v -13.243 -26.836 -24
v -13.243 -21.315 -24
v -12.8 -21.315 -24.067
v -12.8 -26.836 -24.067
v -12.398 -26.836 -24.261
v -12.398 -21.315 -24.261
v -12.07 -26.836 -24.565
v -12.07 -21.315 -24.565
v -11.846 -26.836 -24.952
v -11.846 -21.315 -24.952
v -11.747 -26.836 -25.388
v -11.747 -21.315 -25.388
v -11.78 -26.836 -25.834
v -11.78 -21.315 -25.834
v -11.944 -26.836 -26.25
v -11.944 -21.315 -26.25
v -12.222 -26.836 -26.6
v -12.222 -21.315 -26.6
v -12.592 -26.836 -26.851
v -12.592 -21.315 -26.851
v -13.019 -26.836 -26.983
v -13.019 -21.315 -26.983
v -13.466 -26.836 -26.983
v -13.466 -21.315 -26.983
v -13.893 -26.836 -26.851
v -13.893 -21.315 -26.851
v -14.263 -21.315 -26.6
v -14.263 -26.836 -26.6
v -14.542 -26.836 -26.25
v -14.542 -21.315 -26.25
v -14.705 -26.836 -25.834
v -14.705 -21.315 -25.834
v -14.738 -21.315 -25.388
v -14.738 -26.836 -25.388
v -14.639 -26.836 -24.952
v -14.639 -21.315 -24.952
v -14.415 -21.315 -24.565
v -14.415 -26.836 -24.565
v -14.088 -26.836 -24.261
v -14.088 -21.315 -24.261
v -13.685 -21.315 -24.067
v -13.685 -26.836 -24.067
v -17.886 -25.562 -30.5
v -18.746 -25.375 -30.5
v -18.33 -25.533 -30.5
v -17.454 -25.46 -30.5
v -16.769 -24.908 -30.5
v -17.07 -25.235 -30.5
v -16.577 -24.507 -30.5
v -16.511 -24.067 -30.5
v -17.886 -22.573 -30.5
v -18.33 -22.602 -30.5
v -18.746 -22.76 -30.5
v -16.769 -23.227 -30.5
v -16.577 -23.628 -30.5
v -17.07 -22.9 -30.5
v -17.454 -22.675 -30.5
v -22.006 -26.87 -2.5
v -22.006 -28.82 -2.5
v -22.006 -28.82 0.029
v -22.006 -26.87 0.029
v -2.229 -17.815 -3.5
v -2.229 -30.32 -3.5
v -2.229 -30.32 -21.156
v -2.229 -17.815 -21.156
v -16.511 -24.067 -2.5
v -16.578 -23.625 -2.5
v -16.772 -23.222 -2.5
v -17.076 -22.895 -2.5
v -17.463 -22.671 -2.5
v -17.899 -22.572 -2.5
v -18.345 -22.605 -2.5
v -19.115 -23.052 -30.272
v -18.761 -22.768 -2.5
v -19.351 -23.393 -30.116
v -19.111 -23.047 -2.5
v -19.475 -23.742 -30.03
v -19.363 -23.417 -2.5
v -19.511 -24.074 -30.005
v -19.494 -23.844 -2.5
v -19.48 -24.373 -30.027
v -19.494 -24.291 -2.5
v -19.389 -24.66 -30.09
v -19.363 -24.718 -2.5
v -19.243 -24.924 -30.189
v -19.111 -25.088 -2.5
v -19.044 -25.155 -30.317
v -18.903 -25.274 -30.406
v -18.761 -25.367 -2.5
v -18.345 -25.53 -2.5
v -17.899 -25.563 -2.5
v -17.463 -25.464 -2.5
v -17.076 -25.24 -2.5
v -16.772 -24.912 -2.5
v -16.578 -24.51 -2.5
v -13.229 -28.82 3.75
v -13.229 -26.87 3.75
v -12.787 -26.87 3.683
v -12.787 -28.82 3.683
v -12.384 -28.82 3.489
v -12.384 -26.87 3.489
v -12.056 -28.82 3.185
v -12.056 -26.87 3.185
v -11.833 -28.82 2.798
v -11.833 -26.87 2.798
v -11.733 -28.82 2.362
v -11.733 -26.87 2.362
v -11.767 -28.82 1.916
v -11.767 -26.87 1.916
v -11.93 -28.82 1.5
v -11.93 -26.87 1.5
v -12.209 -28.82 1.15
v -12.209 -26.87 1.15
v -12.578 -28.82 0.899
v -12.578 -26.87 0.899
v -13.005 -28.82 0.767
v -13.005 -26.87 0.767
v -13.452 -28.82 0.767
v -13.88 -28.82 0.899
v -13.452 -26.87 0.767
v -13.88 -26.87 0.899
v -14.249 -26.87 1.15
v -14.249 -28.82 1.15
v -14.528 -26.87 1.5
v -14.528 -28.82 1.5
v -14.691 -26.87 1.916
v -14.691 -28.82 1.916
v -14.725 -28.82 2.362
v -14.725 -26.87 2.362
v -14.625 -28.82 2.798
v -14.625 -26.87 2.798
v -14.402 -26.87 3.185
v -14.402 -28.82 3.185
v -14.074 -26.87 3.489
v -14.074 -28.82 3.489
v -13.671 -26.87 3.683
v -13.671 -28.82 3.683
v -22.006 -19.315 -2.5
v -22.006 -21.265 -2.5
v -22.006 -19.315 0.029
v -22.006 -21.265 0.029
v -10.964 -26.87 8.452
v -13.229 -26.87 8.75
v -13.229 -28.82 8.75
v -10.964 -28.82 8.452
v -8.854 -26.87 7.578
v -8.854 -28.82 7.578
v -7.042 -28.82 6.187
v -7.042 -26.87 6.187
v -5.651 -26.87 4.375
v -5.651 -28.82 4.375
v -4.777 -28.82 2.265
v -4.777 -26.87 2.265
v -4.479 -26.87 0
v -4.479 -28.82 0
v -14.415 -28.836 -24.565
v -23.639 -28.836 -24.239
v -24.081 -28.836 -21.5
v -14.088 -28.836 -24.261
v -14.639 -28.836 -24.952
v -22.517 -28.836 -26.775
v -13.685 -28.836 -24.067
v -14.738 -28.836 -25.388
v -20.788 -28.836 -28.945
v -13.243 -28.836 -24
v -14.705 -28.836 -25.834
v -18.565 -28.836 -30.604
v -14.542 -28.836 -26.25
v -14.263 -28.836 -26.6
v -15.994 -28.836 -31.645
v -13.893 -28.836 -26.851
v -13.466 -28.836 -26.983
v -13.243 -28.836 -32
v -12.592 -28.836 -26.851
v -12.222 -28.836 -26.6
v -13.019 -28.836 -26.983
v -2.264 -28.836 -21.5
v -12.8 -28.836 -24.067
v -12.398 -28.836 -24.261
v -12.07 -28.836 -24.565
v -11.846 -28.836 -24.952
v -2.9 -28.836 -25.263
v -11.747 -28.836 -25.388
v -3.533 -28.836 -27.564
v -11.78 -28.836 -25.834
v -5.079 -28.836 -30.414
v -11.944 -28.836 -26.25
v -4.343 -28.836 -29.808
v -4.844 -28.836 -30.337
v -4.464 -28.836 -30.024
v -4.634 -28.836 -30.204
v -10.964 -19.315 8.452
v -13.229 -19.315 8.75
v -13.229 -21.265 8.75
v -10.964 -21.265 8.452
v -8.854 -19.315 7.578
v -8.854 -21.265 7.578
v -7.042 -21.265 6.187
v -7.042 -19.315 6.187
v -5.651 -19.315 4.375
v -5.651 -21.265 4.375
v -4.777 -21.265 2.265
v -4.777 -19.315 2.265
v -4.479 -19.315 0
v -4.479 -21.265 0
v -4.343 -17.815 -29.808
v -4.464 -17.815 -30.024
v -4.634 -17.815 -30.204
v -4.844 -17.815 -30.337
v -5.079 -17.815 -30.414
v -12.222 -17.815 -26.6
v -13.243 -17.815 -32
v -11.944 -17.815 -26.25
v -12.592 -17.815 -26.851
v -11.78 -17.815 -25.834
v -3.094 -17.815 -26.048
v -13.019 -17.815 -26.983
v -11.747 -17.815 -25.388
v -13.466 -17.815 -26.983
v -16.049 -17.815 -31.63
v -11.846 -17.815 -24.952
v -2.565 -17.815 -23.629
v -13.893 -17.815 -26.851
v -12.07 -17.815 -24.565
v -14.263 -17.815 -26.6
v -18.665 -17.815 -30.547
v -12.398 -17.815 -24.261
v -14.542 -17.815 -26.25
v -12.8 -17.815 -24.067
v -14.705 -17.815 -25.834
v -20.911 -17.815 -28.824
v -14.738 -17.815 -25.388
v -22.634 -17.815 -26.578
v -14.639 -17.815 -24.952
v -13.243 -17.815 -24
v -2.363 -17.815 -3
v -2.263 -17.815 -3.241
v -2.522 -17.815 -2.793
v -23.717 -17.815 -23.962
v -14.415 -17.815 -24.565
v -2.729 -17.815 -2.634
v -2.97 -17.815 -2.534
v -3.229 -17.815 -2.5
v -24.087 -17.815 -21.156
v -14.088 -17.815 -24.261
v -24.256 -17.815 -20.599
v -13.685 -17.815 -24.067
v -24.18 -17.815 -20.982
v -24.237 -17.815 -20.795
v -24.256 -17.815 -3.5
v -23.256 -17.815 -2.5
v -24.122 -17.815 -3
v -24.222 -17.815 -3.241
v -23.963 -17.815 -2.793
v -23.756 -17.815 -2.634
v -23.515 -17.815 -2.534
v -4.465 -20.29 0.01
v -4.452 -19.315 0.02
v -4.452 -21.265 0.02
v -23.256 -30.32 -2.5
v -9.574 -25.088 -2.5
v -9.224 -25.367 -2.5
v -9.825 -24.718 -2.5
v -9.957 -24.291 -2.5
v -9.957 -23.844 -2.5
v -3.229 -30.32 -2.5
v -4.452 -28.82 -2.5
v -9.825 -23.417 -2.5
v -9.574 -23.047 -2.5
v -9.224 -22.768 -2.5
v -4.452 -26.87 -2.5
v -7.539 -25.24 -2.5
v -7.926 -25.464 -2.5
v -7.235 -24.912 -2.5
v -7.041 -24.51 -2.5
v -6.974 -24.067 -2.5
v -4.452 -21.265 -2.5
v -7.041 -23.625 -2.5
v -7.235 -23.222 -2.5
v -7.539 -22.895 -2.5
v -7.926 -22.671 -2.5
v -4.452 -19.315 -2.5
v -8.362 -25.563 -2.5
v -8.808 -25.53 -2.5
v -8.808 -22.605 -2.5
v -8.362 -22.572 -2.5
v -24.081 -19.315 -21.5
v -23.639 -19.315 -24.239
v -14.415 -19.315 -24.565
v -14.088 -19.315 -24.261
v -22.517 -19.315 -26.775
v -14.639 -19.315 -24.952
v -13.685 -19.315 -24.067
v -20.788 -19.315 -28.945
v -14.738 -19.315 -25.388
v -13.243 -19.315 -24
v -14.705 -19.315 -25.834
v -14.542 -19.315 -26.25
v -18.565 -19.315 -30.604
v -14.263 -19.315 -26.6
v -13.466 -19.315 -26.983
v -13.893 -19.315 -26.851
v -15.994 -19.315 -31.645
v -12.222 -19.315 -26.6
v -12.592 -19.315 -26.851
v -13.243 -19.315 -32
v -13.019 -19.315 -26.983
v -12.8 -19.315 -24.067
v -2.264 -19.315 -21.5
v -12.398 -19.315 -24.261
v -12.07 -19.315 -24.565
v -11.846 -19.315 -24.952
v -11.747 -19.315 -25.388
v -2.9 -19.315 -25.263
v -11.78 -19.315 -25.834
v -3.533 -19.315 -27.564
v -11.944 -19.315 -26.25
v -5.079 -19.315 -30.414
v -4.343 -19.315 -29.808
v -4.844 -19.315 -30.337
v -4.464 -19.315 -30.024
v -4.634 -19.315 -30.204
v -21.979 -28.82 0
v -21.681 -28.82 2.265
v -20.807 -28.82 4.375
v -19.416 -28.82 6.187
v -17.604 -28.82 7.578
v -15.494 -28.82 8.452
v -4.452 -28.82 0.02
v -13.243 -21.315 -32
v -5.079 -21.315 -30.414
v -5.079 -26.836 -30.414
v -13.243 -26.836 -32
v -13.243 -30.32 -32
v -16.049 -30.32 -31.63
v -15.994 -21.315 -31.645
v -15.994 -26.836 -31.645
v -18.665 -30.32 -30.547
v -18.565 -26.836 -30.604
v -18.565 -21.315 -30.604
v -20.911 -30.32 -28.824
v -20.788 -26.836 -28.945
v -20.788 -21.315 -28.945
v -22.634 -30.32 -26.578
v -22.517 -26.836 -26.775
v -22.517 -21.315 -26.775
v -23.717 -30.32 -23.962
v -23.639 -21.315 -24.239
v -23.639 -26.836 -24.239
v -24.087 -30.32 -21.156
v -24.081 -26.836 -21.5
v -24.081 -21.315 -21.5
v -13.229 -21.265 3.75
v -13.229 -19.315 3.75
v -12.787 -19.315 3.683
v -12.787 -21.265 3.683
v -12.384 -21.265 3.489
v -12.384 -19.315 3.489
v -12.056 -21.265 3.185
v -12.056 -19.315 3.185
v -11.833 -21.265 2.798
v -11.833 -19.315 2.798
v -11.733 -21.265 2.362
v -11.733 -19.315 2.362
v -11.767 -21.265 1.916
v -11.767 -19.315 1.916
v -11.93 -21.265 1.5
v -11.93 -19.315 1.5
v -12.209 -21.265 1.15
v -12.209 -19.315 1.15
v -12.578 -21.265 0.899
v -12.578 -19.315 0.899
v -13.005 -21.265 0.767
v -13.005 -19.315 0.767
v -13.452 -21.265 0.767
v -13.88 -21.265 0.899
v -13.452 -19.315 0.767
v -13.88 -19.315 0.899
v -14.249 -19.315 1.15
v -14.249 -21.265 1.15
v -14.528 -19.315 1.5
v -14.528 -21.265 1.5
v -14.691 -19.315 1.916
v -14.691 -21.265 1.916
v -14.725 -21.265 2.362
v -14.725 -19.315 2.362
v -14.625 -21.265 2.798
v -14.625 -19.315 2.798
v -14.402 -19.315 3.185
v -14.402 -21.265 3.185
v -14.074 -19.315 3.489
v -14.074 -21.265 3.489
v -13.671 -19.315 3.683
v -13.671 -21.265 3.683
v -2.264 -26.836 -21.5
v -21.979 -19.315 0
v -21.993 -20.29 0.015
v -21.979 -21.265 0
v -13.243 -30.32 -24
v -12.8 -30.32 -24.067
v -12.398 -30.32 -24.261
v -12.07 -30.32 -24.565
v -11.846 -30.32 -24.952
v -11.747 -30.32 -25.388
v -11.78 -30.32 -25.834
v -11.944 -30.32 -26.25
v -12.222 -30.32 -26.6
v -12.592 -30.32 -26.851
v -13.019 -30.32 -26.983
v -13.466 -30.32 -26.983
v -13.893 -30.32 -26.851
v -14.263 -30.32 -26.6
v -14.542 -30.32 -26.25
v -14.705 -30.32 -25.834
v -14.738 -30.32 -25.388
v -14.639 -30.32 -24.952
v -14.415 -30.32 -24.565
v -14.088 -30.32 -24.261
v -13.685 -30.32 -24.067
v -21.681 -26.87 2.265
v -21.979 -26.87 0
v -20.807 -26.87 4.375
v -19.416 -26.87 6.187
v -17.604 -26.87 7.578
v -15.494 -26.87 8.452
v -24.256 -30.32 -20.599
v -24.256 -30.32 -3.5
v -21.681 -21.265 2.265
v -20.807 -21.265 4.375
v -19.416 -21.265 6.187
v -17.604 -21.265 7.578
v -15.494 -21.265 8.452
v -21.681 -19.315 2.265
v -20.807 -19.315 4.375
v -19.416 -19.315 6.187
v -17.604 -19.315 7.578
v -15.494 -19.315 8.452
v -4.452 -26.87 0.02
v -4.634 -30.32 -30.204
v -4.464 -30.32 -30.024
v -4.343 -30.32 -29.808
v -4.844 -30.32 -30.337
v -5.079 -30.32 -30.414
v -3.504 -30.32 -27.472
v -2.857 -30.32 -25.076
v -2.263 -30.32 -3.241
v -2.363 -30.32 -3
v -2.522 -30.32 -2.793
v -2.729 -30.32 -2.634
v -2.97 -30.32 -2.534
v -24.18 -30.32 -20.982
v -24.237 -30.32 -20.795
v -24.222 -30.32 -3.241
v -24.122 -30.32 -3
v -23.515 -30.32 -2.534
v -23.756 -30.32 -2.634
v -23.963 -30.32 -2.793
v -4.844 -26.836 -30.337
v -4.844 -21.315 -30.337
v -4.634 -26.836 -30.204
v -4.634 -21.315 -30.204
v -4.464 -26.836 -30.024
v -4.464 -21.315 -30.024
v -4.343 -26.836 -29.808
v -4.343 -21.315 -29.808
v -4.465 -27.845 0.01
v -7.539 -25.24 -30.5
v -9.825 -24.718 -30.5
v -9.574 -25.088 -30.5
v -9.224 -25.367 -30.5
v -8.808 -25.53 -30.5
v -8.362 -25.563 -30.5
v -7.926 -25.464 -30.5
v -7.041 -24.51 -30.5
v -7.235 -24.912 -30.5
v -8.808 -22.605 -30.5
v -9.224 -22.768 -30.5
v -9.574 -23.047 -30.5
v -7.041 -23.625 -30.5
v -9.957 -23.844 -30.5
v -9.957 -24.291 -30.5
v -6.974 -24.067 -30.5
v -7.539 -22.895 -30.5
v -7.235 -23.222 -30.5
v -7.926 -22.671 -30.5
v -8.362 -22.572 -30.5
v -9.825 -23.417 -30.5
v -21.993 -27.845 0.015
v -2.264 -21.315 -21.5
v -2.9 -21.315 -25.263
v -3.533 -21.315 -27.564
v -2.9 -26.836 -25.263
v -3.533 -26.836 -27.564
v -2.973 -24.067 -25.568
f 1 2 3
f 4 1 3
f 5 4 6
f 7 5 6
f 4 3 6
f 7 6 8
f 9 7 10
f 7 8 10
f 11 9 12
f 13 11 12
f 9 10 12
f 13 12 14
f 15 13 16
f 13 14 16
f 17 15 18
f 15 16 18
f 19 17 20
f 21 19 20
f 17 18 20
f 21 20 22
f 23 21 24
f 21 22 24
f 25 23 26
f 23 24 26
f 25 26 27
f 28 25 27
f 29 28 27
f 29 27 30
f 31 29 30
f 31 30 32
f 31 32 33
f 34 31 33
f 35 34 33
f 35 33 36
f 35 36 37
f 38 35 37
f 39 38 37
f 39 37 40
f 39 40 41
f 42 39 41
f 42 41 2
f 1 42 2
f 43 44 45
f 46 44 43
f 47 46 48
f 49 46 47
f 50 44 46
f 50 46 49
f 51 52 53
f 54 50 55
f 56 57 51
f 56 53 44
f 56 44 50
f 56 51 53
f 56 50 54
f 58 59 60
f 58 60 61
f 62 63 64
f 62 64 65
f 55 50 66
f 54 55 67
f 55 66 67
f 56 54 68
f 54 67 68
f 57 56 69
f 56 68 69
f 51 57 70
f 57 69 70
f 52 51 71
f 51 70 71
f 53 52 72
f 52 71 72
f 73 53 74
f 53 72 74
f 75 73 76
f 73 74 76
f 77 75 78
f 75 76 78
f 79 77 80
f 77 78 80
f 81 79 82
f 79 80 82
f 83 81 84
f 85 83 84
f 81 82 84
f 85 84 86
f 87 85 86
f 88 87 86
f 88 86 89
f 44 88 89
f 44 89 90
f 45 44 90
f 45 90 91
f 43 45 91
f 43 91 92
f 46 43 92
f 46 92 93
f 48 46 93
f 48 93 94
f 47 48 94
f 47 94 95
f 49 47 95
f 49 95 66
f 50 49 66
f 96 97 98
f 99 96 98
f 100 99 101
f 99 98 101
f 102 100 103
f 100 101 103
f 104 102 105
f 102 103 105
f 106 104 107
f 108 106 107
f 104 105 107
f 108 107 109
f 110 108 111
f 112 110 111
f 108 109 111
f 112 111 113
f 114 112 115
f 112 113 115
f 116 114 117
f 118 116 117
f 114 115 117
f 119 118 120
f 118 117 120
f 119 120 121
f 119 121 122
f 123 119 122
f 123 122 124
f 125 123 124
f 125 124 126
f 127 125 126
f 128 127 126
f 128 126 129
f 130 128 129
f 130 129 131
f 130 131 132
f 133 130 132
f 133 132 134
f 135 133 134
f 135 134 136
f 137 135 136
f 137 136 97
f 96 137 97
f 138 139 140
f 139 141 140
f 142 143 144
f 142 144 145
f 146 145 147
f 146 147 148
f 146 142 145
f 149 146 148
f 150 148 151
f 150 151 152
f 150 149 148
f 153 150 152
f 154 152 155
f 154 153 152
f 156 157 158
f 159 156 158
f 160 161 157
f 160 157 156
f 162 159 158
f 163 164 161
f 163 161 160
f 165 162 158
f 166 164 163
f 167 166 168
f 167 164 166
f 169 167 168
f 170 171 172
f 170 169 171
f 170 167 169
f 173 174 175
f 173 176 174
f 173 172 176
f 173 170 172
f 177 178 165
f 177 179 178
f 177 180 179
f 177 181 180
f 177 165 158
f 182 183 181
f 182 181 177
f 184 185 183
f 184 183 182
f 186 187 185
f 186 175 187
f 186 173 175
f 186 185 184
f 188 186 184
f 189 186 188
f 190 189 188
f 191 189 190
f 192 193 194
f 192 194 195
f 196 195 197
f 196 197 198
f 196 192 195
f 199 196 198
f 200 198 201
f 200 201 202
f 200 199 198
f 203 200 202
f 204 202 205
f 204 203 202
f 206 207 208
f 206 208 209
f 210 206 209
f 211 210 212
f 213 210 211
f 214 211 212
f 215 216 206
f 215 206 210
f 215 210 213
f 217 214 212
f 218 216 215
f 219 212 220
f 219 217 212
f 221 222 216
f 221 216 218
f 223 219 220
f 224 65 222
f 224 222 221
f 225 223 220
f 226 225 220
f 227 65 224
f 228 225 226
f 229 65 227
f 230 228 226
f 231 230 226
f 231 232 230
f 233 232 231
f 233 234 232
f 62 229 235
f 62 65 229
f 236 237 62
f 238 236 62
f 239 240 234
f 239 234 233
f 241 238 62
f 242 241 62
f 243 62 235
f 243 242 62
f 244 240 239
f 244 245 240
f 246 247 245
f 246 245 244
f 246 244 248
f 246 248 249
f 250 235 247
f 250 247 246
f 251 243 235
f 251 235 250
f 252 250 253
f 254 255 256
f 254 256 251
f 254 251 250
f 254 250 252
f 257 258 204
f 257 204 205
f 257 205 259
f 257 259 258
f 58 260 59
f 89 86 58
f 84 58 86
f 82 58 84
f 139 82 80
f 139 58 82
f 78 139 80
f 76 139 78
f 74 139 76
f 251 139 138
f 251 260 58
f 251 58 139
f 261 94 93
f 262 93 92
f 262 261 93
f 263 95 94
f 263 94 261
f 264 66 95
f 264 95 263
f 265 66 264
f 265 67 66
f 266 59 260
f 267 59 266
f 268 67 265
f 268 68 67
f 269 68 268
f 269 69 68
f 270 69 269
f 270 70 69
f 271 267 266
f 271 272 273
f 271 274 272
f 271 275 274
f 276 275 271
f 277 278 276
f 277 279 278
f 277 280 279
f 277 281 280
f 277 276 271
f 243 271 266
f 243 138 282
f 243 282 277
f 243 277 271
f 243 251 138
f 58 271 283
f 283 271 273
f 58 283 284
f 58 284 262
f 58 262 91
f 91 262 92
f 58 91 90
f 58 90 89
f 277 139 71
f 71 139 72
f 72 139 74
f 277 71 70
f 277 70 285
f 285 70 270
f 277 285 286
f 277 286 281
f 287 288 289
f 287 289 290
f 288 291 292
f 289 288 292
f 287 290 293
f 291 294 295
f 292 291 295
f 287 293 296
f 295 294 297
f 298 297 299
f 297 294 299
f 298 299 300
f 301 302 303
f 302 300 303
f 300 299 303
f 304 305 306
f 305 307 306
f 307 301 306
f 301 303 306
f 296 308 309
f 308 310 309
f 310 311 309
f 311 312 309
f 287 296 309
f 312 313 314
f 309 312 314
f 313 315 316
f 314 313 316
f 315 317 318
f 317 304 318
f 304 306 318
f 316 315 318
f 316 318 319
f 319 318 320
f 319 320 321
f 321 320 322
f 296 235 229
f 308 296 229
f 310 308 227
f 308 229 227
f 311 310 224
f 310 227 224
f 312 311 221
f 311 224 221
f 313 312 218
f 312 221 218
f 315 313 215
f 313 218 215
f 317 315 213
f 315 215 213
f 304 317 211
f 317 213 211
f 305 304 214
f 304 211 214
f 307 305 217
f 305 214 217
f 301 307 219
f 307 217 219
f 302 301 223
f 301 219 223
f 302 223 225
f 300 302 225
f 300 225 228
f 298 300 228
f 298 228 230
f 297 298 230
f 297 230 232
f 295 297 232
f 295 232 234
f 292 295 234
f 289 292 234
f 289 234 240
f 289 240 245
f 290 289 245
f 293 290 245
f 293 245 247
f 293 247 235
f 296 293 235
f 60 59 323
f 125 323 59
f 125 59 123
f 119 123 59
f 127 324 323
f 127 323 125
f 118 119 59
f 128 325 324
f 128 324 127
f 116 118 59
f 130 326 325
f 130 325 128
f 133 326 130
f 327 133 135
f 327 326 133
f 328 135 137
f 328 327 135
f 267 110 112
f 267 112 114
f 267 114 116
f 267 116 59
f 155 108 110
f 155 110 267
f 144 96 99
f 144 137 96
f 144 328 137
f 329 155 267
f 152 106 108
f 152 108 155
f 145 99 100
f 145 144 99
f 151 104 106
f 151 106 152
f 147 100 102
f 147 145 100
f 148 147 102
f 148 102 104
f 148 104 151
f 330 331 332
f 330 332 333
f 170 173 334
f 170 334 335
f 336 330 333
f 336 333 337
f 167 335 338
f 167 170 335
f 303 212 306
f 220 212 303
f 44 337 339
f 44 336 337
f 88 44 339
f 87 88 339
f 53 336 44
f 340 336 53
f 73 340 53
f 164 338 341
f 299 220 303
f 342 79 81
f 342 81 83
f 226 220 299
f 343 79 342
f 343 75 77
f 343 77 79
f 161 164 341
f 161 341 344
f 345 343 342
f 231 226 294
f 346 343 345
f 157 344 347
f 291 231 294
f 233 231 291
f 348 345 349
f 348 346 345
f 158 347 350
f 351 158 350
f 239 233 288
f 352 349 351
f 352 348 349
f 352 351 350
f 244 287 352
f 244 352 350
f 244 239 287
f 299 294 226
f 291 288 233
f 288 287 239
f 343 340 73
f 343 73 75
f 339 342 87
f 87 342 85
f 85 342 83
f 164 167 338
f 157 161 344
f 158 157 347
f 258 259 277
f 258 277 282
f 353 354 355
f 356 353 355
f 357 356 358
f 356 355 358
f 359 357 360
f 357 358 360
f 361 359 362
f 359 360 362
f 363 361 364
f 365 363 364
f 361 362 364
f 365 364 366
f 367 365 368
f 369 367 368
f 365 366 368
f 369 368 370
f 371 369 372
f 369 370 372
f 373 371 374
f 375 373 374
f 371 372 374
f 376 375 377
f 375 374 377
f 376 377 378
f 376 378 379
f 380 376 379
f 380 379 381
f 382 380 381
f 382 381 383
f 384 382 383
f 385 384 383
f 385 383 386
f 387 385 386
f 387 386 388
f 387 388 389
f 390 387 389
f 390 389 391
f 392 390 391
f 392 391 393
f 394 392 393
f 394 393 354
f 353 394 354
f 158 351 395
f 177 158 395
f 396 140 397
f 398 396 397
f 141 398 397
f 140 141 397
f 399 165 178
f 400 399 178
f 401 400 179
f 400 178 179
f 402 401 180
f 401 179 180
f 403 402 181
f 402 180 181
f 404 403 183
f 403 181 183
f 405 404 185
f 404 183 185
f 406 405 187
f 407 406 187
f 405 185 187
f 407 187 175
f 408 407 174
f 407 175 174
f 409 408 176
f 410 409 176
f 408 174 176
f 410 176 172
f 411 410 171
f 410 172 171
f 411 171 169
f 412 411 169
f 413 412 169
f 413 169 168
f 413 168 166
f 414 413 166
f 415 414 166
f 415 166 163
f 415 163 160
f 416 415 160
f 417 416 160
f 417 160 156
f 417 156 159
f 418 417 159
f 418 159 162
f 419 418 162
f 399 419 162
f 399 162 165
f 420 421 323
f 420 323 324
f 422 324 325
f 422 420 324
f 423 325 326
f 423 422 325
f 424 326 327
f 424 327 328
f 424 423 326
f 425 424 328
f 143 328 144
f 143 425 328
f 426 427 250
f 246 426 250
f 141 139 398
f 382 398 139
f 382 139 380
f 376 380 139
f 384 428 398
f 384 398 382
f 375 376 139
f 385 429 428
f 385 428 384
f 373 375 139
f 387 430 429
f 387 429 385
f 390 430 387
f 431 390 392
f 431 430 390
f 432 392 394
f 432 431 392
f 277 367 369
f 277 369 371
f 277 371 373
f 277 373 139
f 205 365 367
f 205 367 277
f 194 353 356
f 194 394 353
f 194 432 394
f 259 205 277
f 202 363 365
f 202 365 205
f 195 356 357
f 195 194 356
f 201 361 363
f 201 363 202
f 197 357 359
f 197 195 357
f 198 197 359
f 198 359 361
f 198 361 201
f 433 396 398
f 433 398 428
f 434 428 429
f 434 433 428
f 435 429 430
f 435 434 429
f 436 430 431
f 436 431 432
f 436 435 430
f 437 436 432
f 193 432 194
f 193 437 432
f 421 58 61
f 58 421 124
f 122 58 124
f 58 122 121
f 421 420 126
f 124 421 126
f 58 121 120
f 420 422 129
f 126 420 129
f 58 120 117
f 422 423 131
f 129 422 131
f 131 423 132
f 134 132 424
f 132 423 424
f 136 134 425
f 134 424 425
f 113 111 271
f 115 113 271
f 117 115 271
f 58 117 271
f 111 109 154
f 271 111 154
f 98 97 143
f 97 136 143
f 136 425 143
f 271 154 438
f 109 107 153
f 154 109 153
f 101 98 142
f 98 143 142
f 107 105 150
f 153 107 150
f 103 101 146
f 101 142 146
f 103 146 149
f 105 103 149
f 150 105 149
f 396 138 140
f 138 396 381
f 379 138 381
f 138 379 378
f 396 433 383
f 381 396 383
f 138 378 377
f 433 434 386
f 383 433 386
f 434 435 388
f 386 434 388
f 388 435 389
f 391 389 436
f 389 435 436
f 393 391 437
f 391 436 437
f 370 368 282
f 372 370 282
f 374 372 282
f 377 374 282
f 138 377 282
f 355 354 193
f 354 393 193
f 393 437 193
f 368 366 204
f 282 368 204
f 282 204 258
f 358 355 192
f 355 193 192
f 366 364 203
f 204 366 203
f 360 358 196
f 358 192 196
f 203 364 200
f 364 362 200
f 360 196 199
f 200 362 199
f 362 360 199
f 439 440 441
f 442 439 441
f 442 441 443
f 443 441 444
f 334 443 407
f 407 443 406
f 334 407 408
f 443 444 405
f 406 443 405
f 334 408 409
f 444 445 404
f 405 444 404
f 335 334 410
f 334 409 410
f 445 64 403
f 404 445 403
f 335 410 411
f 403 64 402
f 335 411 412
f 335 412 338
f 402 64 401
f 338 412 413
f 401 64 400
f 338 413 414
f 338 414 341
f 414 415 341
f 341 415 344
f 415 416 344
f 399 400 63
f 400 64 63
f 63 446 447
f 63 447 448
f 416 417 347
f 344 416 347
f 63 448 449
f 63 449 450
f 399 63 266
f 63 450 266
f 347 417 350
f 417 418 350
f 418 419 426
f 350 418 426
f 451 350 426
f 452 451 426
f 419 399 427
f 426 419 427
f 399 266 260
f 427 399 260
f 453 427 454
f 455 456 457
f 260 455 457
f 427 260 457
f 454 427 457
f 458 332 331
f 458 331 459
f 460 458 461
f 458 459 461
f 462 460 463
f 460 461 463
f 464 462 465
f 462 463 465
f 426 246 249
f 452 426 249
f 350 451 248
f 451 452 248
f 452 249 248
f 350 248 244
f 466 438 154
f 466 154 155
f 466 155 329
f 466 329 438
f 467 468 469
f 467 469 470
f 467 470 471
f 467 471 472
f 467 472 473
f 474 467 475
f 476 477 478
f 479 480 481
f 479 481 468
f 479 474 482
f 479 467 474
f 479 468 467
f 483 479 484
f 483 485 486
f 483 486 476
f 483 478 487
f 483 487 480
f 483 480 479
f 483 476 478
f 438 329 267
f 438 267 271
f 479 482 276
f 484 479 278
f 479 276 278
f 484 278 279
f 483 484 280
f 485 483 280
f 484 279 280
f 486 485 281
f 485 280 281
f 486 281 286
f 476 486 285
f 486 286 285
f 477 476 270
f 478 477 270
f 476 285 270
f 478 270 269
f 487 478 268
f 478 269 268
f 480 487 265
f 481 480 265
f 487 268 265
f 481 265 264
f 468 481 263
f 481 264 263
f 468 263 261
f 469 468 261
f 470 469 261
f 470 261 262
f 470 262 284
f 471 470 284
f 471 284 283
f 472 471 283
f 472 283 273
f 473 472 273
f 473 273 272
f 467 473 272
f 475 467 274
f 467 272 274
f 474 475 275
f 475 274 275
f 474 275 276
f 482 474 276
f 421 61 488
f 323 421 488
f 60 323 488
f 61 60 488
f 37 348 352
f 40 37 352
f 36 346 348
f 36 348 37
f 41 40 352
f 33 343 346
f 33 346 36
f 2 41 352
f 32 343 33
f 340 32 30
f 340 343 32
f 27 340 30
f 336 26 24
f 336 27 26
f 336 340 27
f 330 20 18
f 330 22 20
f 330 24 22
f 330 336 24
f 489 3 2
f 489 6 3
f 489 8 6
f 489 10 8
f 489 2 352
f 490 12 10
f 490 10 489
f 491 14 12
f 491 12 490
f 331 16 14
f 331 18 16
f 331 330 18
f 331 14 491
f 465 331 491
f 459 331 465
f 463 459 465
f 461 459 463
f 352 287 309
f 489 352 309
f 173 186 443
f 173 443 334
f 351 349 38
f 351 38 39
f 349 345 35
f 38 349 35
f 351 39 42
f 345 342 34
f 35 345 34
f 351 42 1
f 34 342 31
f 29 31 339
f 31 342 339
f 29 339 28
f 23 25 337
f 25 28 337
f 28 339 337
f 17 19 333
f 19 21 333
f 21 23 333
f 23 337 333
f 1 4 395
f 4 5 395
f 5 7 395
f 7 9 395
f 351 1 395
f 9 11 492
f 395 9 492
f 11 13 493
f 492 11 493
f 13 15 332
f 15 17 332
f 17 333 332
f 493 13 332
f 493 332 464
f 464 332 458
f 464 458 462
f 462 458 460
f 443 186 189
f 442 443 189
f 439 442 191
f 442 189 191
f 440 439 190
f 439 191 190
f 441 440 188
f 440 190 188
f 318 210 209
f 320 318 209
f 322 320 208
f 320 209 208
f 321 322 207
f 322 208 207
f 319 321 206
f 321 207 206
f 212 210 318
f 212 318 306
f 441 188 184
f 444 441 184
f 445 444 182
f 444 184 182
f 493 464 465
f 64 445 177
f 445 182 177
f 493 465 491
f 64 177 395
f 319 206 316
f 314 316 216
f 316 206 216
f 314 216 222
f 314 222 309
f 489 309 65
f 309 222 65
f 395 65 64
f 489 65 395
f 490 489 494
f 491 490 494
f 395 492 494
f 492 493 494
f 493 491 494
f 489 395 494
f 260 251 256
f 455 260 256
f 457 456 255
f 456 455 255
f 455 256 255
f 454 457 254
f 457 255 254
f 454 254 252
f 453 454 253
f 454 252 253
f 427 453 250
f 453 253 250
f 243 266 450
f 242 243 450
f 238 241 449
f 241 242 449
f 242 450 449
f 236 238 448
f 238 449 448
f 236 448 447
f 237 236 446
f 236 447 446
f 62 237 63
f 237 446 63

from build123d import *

# Parameters (mm, degrees)
SKETCH2_W             = 17.554431489
SKETCH2_H             = 1.95
BOSS_EXTRUDE1_DEPTH   = 8.75
BOSS_EXTRUDE1_2_DEPTH = 8.75
CUT_EXTRUDE1_DEPTH    = 26.518349076
SKETCH4_W             = 22.027215745
SKETCH4_H             = 12.505427167
BOSS_EXTRUDE2_DEPTH   = 32
SKETCH5_R             = 1.5
CUT_EXTRUDE2_DEPTH    = 12
SKETCH6_W             = 22.027215745
SKETCH6_H             = 12.505427167
SKETCH6_W_2           = 17.554431489
SKETCH6_H_2           = 1.95
CUT_EXTRUDE3_DEPTH    = 2.5
SKETCH7_R             = 1.5
CUT_EXTRUDE4_DEPTH    = 13
SKETCH8_R             = 1.5
CUT_EXTRUDE5_DEPTH    = 28
FILLET3_R             = 1
SKETCH9_W             = 22.02721574
SKETCH9_H             = 2
CUT_EXTRUDE6_DEPTH    = 11


with BuildPart() as part:
    # Sketch2 → Boss-Extrude1 (new body)
    with BuildSketch(Plane.XY):
        with Locations((-13.228930986, -27.845183414)):
            Rectangle(SKETCH2_W, SKETCH2_H)
    extrude(amount=BOSS_EXTRUDE1_DEPTH)


with BuildPart() as body_2:
    # Sketch2 → Boss-Extrude1 2 (new body)
    with BuildSketch(Plane.XY):
        with Locations((-13.228930986, -20.289756247)):
            Rectangle(SKETCH2_W, SKETCH2_H)
    extrude(amount=BOSS_EXTRUDE1_2_DEPTH)


with BuildPart() as cut_extrude1_tool:
    # Sketch3 → Cut-Extrude1 (new, through all)
    with BuildSketch(Plane(origin=(0, -19.314756247, 0), x_dir=(1, 0, 0), z_dir=(0, 1, 0))):
        with BuildLine():
            ThreePointArc((-13.228930986, -8.75), (-7.041746651, -6.187184335), (-4.478930986, 0))
            add(Edge.make_bspline(
                [(-4.478930986, 0), (1.138349918, -4.151657709), (-4.451715242, -8.75)],
                knots=[0, 0, 0, 1, 1, 1], degree=2))
            add(Edge.make_bspline(
                [(-22.006146731, -8.75), (-13.228930986, -12.473510392), (-4.451715242, -8.75)],
                knots=[0, 0, 0, 1, 1, 1], degree=2))
            add(Edge.make_bspline(
                [(-21.978930986, 0), (-25.926969228, -4.242865138), (-22.006146731, -8.75)],
                knots=[0, 0, 0, 1, 1, 1], degree=2))
            ThreePointArc((-21.978930986, 0), (-19.416115322, -6.187184335), (-13.228930986, -8.75))
        make_face()
    extrude(amount=-CUT_EXTRUDE1_DEPTH)


with BuildPart() as part_1:
    add(part.part)

    # Cut-Extrude1: cut by cut_extrude1_tool
    add(cut_extrude1_tool.part, mode=Mode.SUBTRACT)



with BuildPart() as body_2_1:
    add(body_2.part)

    # Cut-Extrude1: cut by cut_extrude1_tool
    add(cut_extrude1_tool.part, mode=Mode.SUBTRACT)


with BuildPart() as part_2:
    add(part_1.part)

    add(body_2_1.part)  # Boss-Extrude2 merges body 2
    # Sketch4 → Boss-Extrude2 (add)
    with BuildSketch(Plane(origin=(0, 0, 0), x_dir=(-1, 0, 0), z_dir=(0, 0, -1))):
        with Locations((13.242538859, -24.067469831)):
            Rectangle(SKETCH4_W, SKETCH4_H)
    extrude(amount=BOSS_EXTRUDE2_DEPTH)

    # Sketch5 → Cut-Extrude2 (cut)
    with BuildSketch(Plane(origin=(0, -19.314756247, 0), x_dir=(1, 0, 0), z_dir=(0, 1, 0))):
        with Locations(Location((-13.228930986, -2.25, 0), (0, 0, 270))):
            Circle(SKETCH5_R)
    extrude(amount=-CUT_EXTRUDE2_DEPTH, mode=Mode.SUBTRACT)

    # Sketch6 → Cut-Extrude3 (cut)
    with BuildSketch(Plane.XY):
        with Locations((-13.242538859, -24.067469831)):
            Rectangle(SKETCH6_W, SKETCH6_H)
        with Locations((-13.228930986, -27.845183414)):
            Rectangle(SKETCH6_W_2, SKETCH6_H_2, mode=Mode.SUBTRACT)
        with Locations((-13.228930986, -20.289756247)):
            Rectangle(SKETCH6_W_2, SKETCH6_H_2, mode=Mode.SUBTRACT)
    extrude(amount=-CUT_EXTRUDE3_DEPTH, mode=Mode.SUBTRACT)

    # Sketch7 → Cut-Extrude4 (cut)
    with BuildSketch(Plane(origin=(0, -17.814756247, 0), x_dir=(1, 0, 0), z_dir=(0, 1, 0))):
        with Locations(Location((-13.242538859, 25.5, 0), (0, 0, 270))):
            Circle(SKETCH7_R)
        with BuildLine():
            Line((-24.086865874, 21.155672985), (-24.256146731, 21.155672985))
            add(Edge.make_bspline(
                [(-2.228930986, 21.155672985), (11.471530889, 27.189710441), (-11.765166974, 53.431279988), (-37.007876173, 21.523583672), (-24.256146731, 21.155672985)],
                knots=[0, 0, 0, 0, 0.52011282, 1, 1, 1, 1], degree=3))
            add(Edge.make_bspline(
                [(-4.552660132, 30.311399113), (-2.685211009, 25.928521854), (-2.228930986, 21.155672985)],
                knots=[0, 0, 0, 1, 1, 1], degree=2))
            Line((-4.552660132, 30.311399113), (-13.242538859, 32))
            ThreePointArc((-13.242538859, 32), (-20.910636028, 28.823770155), (-24.086865874, 21.155672985))
        make_face()
    extrude(amount=-CUT_EXTRUDE4_DEPTH, mode=Mode.SUBTRACT)

    # Sketch8 → Cut-Extrude5 (cut)
    with BuildSketch(Plane.XY.offset(-2.5)):
        with Locations((-18.011106811, -24.06746983)):
            Circle(SKETCH8_R)
        with Locations((-8.473970906, -24.06746983)):
            Circle(SKETCH8_R)
    extrude(amount=-CUT_EXTRUDE5_DEPTH, mode=Mode.SUBTRACT)

    # Fillet3
    # the kernel refuses this fillet: 1 mm, written as the material it takes off along each edge
    with BuildSketch(Plane(origin=(-24.256146731, -15.314756247, -2.5), x_dir=(0, 0, -1), z_dir=(0, -1, 0)), Plane(origin=(-2.228930986, -32.820183414, -2.5), x_dir=(0, 0, -1), z_dir=(0, 1, 0))) as fillet3_piece_1:
        with BuildLine():
            CenterArc((FILLET3_R, FILLET3_R), FILLET3_R, 180, 90)
            Line((0, FILLET3_R), (-FILLET3_R * 0.02, FILLET3_R))
            Line((-FILLET3_R * 0.02, FILLET3_R), (-FILLET3_R * 0.02, -FILLET3_R * 0.02))
            Line((-FILLET3_R * 0.02, -FILLET3_R * 0.02), (FILLET3_R, -FILLET3_R * 0.02))
            Line((FILLET3_R, -FILLET3_R * 0.02), (FILLET3_R, 0))
        make_face()
    extrude(amount=17.505427167, mode=Mode.SUBTRACT)
    with BuildSketch(Plane(origin=(-24.256146731, -16.423026869, -21.155672985), x_dir=(1.0, 0, 2.5394386720559264e-12), z_dir=(0, -1, 0))) as fillet3_piece_2:
        with BuildLine():
            CenterArc((1, 0.556691751), FILLET3_R, 180, 33.827317624)
            Line((0, 0.556691751), (-0.02, 0.556691751))
            Line((-0.02, 0.556691751), (-0.02, 0))
            Line((-0.02, 0), (0, -0.02))
            ThreePointArc((0, -0.02), (0.084640429, -0.02), (0.152666474, -0.011133835))
            Line((0.152666474, -0.011133835), (0.169280857, 0))
        make_face()
    extrude(amount=15.288885922, mode=Mode.SUBTRACT)
    with BuildSketch(Plane(origin=(-4.552660132, -16.451585564, -30.311399113), x_dir=(0.3839298520349852, 0, 0.9233622629912891), z_dir=(0, -1, 0))) as fillet3_piece_3:
        with BuildLine():
            CenterArc((0.536514164, 0.999961682), FILLET3_R, 213.573886674, 56.927693277)
            Line((-0.296659206, 0.446949805), (-0.313322674, 0.435889568))
            Line((-0.313322674, 0.435889568), (-0.016663467, -0.011060238))
            Line((-0.016663467, -0.011060238), (-0.0001747, -0.019999237))
            ThreePointArc((-0.0001747, -0.019999237), (0.272634035, -0.021192075), (0.545443356, -0.019999234))
            Line((0.545443356, -0.019999234), (0.545268273, 0))
        make_face()
    extrude(amount=15.231768533, mode=Mode.SUBTRACT)

    # Sketch9 → Cut-Extrude6 (cut)
    with BuildSketch(Plane.XY.offset(-32.5)):
        with Locations((-13.24253886, -20.31475625)):
            Rectangle(SKETCH9_W, SKETCH9_H)
        with Locations((-13.24253886, -27.836055834)):
            Rectangle(SKETCH9_W, SKETCH9_H)
    extrude(amount=CUT_EXTRUDE6_DEPTH, mode=Mode.SUBTRACT)


solid = part_2.part
